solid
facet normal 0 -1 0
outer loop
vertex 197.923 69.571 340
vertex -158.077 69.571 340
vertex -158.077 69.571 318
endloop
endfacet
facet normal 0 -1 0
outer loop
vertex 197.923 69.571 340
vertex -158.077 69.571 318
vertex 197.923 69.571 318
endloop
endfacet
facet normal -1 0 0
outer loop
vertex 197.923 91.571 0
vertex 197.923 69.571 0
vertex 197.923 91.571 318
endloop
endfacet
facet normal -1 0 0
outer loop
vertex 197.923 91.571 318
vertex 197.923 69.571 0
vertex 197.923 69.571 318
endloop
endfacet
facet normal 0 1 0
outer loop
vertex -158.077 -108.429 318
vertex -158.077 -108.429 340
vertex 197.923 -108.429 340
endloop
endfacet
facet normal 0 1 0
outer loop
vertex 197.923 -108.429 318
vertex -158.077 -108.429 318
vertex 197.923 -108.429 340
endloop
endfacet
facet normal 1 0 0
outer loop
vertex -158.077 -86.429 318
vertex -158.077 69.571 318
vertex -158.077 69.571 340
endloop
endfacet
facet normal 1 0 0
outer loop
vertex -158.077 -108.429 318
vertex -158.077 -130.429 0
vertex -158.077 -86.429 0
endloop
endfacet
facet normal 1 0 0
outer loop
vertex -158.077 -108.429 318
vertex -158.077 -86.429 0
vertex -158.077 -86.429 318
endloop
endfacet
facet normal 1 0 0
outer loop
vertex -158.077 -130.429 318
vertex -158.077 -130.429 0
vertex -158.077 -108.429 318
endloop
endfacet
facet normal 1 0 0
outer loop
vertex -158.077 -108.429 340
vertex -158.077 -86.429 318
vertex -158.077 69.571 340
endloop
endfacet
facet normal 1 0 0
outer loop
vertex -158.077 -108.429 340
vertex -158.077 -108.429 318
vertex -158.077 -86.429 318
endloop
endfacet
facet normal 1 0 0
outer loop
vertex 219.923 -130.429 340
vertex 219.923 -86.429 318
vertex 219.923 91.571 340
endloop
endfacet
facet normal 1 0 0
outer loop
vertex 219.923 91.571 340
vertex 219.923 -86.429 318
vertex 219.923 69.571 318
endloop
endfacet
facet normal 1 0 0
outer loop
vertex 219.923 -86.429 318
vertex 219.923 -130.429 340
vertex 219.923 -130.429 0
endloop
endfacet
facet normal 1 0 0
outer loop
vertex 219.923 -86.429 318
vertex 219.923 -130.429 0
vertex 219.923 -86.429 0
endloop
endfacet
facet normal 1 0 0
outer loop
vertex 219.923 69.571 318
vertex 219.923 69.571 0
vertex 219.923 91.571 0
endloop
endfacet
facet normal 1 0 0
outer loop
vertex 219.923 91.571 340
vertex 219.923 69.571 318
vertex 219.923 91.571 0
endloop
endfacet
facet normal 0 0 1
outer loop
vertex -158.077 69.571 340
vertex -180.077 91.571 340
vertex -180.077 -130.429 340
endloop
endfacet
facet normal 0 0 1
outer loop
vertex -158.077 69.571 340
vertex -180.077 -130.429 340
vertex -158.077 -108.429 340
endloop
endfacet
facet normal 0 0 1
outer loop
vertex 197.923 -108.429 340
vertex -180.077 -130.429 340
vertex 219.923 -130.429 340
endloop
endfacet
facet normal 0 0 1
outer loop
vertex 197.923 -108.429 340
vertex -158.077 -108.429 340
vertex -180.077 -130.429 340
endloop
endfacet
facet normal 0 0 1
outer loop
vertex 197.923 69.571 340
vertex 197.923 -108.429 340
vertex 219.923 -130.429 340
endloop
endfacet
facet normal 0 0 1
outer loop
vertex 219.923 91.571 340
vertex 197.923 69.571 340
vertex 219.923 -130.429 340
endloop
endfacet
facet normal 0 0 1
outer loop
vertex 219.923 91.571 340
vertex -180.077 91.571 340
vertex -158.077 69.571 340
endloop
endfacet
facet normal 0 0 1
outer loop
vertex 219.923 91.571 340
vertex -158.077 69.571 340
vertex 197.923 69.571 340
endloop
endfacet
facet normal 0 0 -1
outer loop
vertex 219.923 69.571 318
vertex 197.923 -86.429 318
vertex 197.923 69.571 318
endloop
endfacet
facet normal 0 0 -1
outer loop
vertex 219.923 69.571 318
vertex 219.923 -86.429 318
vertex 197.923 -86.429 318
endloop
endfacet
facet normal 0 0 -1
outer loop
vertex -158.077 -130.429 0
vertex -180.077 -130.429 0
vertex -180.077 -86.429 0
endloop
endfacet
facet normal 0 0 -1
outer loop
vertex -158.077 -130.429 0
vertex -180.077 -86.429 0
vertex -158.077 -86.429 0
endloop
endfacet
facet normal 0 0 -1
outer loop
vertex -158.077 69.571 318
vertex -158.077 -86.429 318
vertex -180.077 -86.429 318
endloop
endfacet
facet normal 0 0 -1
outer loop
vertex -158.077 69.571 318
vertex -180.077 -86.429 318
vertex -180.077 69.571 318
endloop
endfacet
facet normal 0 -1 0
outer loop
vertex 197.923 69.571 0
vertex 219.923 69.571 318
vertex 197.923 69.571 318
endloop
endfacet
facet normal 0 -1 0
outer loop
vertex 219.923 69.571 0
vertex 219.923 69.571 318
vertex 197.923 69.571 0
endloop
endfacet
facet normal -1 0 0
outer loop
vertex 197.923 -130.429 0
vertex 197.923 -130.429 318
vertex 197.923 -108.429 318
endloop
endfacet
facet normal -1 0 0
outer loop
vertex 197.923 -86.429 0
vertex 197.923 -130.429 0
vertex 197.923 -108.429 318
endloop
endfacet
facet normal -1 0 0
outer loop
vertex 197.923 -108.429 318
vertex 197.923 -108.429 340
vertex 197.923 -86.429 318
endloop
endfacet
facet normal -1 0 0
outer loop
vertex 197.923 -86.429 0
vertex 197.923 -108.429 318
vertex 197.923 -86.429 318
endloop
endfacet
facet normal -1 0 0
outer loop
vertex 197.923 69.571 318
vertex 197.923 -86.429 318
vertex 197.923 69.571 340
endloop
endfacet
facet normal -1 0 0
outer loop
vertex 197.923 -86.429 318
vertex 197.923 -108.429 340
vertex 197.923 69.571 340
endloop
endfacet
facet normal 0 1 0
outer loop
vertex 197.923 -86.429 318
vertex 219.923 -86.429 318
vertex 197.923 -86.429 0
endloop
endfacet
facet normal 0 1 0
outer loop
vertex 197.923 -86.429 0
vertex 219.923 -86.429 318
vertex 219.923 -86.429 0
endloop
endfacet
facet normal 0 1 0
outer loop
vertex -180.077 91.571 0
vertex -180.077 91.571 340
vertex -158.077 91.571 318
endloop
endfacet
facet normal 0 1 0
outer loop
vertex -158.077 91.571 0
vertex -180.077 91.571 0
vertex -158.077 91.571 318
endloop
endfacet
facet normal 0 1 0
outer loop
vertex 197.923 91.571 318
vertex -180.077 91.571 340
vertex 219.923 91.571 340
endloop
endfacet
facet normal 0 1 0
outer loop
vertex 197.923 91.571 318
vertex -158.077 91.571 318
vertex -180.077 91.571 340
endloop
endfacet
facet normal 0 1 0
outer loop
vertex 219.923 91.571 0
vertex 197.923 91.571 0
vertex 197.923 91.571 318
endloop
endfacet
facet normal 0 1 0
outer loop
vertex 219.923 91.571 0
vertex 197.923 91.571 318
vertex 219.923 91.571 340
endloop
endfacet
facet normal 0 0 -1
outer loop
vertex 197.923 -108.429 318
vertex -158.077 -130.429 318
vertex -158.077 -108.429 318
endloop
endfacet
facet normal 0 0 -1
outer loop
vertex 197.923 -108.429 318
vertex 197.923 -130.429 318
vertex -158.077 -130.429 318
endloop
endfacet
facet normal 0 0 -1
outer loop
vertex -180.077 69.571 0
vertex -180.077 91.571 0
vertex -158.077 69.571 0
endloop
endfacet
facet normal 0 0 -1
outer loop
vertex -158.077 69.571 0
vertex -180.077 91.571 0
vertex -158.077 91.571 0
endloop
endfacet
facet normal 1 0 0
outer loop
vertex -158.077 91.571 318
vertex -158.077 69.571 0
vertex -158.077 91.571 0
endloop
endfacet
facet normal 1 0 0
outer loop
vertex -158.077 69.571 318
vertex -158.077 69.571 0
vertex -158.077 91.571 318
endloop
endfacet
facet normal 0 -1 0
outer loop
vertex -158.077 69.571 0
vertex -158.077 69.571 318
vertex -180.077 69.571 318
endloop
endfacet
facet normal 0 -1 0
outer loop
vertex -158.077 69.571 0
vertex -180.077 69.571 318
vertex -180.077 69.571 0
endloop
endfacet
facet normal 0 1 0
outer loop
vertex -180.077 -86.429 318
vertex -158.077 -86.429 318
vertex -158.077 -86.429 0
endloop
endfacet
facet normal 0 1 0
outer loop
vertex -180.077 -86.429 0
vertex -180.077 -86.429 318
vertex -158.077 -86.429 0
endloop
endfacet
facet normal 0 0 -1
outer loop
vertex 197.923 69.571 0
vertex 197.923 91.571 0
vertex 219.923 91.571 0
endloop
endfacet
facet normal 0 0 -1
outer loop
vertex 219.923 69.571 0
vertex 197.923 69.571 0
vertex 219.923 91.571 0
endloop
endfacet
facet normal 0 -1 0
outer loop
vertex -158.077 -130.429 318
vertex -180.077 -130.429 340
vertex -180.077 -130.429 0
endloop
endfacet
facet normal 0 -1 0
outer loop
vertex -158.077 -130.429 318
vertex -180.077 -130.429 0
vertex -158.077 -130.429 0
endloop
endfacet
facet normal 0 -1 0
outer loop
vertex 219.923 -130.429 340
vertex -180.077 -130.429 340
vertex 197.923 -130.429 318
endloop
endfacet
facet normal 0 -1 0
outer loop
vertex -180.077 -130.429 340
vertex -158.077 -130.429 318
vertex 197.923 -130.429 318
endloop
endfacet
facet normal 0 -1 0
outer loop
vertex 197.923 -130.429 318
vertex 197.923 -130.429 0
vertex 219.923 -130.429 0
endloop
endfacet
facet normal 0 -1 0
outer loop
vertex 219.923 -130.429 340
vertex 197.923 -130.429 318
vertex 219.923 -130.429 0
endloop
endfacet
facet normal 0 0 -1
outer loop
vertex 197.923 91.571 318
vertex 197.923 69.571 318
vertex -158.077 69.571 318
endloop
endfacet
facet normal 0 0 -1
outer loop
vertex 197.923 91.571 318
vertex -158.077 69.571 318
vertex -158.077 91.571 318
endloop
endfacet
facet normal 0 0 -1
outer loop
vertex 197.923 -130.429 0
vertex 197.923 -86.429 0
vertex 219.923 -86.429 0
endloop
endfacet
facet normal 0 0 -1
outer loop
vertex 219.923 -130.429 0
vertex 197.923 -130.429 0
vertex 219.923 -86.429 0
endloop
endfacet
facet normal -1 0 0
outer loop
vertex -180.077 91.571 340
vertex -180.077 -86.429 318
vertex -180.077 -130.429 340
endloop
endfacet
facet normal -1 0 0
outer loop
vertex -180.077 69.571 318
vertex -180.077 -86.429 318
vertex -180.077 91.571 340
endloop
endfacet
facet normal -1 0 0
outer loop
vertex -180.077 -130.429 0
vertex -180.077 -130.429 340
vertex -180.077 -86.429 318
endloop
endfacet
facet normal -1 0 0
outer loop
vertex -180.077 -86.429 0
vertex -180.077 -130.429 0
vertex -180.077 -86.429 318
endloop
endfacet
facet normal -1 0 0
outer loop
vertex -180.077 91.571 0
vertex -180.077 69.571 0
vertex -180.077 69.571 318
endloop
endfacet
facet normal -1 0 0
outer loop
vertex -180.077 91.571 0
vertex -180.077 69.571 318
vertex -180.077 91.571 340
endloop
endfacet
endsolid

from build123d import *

# Parameters (mm, degrees)
ESQUISSE1_W             = 400
ESQUISSE1_H             = 222
BOSS_EXTRU_1_DEPTH      = 340
ESQUISSE2_W             = 356
ESQUISSE2_H             = 318
ENL_V_MAT_EXTRU_1_DEPTH = 462.790308903
ESQUISSE8_W             = 318
ESQUISSE8_H             = 156
ENL_V_MAT_EXTRU_2_DEPTH = 541.935999009
ESQUISSE9_W             = 356
ESQUISSE9_H             = 178
ENL_V_MAT_EXTRU_3_DEPTH = 426.41514362


with BuildPart() as part:
    # Esquisse1 → Boss.-Extru.1 (new body)
    with BuildSketch(Plane.XY):
        with Locations((19.923371648, -19.429118774)):
            Rectangle(ESQUISSE1_W, ESQUISSE1_H)
    extrude(amount=BOSS_EXTRU_1_DEPTH)

    # Esquisse2 → Enlèv. mat.-Extru.1 (cut, through all)
    with BuildSketch(Plane.XZ.offset(130.429118774)):
        with Locations((19.923371648, 159)):
            Rectangle(ESQUISSE2_W, ESQUISSE2_H)
    extrude(amount=-ENL_V_MAT_EXTRU_1_DEPTH, mode=Mode.SUBTRACT)

    # Esquisse8 → Enlèv. mat.-Extru.2 (cut, through all)
    with BuildSketch(Plane(origin=(219.923371648, 0, 0), x_dir=(0, 0, -1), z_dir=(1, 0, 0))):
        with Locations((-159, -8.429118774)):
            Rectangle(ESQUISSE8_W, ESQUISSE8_H)
    extrude(amount=-ENL_V_MAT_EXTRU_2_DEPTH, mode=Mode.SUBTRACT)

    # Esquisse9 → Enlèv. mat.-Extru.3 (cut, through all)
    with BuildSketch(Plane.XY.offset(340)):
        with Locations((19.923371648, -19.429118774)):
            Rectangle(ESQUISSE9_W, ESQUISSE9_H)
    extrude(amount=-ENL_V_MAT_EXTRU_3_DEPTH, mode=Mode.SUBTRACT)


solid = part.part
